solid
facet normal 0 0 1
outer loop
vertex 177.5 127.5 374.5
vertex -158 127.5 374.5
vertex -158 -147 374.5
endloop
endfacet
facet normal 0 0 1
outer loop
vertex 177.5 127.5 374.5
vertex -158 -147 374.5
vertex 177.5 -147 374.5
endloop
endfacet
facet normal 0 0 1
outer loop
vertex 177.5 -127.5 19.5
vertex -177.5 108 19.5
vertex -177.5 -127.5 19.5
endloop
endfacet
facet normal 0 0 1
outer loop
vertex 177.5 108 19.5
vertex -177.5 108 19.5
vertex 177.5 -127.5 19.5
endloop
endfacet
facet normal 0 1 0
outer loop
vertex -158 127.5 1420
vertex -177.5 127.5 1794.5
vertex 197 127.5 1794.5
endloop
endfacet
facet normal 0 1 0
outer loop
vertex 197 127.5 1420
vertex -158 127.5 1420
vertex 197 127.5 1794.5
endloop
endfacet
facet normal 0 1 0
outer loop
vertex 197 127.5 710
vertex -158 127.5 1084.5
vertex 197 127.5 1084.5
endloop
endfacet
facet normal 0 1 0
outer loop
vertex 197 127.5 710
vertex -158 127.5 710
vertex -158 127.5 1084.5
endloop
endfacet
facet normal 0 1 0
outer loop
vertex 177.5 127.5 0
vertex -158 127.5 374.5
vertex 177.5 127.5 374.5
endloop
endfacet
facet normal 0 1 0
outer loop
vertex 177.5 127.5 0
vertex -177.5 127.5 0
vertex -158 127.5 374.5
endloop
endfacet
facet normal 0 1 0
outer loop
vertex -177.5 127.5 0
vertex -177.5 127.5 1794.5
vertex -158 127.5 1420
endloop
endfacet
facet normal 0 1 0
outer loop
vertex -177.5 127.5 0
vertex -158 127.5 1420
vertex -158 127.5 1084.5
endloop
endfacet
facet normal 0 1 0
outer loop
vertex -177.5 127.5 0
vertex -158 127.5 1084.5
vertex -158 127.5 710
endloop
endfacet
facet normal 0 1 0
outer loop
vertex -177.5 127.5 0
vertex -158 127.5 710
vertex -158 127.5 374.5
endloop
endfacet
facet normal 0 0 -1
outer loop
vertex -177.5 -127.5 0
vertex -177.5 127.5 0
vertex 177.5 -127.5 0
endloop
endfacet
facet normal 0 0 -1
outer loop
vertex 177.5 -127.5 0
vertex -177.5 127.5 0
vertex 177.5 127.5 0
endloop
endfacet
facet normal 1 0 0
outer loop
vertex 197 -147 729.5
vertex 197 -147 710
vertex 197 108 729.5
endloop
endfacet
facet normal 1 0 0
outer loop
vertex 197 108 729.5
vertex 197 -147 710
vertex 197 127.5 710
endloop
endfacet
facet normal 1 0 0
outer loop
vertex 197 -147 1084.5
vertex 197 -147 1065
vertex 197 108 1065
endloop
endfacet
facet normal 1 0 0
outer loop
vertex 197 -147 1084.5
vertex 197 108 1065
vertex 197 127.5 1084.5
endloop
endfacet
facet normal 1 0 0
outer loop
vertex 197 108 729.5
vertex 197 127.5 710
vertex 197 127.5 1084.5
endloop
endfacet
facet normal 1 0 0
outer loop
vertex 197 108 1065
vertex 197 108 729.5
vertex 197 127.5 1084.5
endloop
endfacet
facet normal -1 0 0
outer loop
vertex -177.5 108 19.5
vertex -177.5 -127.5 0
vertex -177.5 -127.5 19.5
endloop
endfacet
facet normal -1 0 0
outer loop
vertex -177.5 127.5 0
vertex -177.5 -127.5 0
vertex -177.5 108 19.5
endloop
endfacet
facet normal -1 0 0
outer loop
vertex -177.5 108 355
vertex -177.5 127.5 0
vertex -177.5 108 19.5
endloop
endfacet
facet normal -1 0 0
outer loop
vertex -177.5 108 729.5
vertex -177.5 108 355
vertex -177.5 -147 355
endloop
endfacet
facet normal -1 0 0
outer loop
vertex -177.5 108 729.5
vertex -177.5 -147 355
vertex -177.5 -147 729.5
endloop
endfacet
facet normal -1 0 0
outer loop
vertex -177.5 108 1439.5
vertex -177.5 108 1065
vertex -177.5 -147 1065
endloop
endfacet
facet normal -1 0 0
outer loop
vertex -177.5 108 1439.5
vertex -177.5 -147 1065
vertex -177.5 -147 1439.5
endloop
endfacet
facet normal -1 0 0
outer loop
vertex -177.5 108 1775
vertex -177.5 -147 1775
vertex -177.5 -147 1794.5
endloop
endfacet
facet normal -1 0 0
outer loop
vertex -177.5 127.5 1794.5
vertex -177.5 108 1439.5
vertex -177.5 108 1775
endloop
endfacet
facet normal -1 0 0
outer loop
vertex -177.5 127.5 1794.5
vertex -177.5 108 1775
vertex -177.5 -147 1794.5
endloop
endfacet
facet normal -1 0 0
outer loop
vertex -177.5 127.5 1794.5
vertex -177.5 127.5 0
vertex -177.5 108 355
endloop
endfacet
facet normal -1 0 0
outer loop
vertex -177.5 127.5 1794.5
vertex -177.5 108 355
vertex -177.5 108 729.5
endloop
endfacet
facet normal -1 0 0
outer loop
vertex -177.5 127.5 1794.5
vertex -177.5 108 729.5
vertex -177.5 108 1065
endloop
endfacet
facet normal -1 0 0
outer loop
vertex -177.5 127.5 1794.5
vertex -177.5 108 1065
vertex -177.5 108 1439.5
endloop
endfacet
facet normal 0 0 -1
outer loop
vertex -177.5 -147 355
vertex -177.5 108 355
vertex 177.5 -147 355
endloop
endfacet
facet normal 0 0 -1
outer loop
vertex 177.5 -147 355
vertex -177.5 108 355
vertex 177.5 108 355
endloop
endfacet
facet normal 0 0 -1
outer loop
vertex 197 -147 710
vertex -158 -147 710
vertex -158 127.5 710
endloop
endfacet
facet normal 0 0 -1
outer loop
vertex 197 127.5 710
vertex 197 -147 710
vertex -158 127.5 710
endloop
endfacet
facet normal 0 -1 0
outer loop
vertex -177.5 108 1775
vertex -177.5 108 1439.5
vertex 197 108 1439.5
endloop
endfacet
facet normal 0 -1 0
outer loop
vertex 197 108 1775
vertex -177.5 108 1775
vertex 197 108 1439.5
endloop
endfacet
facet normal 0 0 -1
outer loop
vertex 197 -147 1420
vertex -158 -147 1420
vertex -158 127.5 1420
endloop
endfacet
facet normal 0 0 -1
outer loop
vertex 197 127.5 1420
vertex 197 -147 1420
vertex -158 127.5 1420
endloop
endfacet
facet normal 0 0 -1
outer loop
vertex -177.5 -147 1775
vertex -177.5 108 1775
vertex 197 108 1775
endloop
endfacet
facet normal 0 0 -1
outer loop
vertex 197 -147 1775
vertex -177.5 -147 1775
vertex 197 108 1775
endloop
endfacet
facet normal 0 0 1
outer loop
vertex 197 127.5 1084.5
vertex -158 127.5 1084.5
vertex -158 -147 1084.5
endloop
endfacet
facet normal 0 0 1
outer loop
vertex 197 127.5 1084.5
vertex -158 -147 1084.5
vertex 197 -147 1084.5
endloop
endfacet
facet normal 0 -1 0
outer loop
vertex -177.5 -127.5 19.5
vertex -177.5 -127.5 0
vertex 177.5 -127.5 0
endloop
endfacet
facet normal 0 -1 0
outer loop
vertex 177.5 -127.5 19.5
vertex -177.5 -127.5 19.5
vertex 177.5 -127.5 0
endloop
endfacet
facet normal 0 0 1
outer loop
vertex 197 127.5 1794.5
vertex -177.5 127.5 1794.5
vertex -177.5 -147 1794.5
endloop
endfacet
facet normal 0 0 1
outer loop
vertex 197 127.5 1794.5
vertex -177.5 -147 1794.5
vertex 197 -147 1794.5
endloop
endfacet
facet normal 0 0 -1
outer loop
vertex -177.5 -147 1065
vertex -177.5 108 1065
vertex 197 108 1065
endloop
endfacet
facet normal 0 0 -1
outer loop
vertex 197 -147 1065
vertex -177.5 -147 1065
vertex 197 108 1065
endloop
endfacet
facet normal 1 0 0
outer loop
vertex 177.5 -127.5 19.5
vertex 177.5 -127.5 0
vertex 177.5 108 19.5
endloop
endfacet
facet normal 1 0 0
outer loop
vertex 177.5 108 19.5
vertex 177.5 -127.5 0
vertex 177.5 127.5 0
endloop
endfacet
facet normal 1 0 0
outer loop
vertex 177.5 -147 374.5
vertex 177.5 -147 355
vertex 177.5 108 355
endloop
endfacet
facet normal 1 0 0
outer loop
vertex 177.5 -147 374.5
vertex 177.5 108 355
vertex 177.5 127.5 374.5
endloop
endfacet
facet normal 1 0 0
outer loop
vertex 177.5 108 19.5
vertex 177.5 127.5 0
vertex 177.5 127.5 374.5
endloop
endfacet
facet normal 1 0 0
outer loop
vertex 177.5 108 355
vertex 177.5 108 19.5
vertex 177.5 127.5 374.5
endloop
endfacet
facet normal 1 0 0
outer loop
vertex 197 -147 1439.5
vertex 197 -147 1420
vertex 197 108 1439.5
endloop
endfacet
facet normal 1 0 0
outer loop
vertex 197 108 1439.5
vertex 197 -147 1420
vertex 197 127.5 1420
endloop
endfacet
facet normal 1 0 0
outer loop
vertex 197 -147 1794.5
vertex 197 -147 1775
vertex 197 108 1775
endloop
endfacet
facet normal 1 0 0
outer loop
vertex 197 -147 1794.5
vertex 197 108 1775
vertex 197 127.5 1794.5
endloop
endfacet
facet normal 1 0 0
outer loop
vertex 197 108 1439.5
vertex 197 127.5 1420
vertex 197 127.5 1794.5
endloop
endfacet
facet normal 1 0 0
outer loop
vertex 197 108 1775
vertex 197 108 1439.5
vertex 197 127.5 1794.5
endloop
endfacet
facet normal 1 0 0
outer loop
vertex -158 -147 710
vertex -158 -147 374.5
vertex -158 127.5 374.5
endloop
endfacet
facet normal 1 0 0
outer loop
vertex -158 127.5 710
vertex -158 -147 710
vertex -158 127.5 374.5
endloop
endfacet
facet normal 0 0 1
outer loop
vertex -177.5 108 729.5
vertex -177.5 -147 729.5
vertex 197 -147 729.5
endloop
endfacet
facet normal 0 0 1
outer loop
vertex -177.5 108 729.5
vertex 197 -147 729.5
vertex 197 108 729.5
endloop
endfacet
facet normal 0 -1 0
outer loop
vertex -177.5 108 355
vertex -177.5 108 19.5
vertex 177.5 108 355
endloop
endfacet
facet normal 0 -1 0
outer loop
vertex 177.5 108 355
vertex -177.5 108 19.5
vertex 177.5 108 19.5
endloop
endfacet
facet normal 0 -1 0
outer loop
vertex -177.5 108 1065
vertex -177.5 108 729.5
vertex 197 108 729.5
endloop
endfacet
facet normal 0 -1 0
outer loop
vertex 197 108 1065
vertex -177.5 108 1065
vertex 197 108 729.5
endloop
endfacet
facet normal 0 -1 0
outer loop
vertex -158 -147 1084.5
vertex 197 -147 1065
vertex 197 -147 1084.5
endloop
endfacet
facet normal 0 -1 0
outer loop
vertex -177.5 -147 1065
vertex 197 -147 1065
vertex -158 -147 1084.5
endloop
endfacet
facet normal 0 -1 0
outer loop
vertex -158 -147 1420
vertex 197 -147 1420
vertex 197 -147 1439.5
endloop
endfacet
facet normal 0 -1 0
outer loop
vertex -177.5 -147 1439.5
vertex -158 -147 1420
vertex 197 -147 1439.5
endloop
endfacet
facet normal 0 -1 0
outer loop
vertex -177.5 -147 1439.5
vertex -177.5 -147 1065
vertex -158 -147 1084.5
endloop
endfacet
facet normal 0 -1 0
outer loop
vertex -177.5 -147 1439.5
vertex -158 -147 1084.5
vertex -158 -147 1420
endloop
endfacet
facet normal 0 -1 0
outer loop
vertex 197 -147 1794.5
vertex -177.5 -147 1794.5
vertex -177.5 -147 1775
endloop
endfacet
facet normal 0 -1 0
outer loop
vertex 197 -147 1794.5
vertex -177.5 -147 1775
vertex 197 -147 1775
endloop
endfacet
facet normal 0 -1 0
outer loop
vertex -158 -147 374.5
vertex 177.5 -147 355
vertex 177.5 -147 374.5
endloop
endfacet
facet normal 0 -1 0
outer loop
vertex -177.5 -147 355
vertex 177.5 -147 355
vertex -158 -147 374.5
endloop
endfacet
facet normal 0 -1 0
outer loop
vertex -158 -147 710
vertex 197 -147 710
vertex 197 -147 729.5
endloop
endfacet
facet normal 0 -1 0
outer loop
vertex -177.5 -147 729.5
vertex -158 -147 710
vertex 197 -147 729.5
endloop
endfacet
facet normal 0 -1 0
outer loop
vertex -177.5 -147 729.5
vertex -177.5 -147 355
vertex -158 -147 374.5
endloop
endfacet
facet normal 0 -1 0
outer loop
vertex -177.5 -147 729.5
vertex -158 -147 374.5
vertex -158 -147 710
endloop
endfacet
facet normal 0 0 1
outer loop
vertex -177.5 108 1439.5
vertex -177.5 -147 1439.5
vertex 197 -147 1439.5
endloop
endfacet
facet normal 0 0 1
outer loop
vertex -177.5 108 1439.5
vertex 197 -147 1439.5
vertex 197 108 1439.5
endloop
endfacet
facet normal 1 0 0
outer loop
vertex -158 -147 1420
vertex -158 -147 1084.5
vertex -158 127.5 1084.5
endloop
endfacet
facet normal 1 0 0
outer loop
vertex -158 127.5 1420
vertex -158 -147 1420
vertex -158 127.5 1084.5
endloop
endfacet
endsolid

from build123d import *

# Parameters (mm, degrees)
F0_W      = 355
F0_H      = 255
F1_DEPTH  = 19.5
F2_W      = 355
F2_H      = 19.5
F3_DEPTH  = 355
F4_W      = 355
F4_H      = 19.5
F5_DEPTH  = 255
F6_W      = 19.5
F6_H      = 274.5
F7_DEPTH  = 355
F8_W      = 274.5
F8_H      = 19.5
F9_DEPTH  = 355
F10_W     = 374.5
F10_H     = 19.5
F11_DEPTH = 355
F12_W     = 374.5
F12_H     = 19.5
F13_DEPTH = 255
F14_W     = 19.5
F14_H     = 274.5
F15_DEPTH = 355
F16_W     = 274.5
F16_H     = 19.5
F17_DEPTH = 355
F18_W     = 374.5
F18_H     = 19.5
F19_DEPTH = 355
F20_W     = 374.5
F20_H     = 19.5
F21_DEPTH = 255


with BuildPart() as f1:
    # F0 (on Top) → F1 (new body)
    with BuildSketch(Plane.XY):
        Rectangle(F0_W, F0_H)
    extrude(amount=F1_DEPTH)

    # F2 (on face) → F3 (join)
    with BuildSketch(Plane.XY.offset(19.5)):
        with Locations((0, 117.75)):
            Rectangle(F2_W, F2_H)
    extrude(amount=F3_DEPTH)

    # F4 (on face) → F5 (join)
    with BuildSketch(Plane.XZ.offset(-108)):
        with Locations((0, 364.75)):
            Rectangle(F4_W, F4_H)
    extrude(amount=F5_DEPTH)

    # F6 (on face) → F7 (join)
    with BuildSketch(Plane.XY.offset(374.5)):
        with Locations((-167.75, -9.75)):
            Rectangle(F6_W, F6_H)
    extrude(amount=F7_DEPTH)

    # F8 (on face) → F9 (join)
    with BuildSketch(Plane.YZ.offset(-158)):
        with Locations((-9.75, 719.75)):
            Rectangle(F8_W, F8_H)
    extrude(amount=F9_DEPTH)

    # F10 (on face) → F11 (join)
    with BuildSketch(Plane.XY.offset(729.5)):
        with Locations((9.75, 117.75)):
            Rectangle(F10_W, F10_H)
    extrude(amount=F11_DEPTH)

    # F12 (on face) → F13 (join)
    with BuildSketch(Plane.XZ.offset(-108)):
        with Locations((9.75, 1074.75)):
            Rectangle(F12_W, F12_H)
    extrude(amount=F13_DEPTH)

    # F14 (on face) → F15 (join)
    with BuildSketch(Plane.XY.offset(1084.5)):
        with Locations((-167.75, -9.75)):
            Rectangle(F14_W, F14_H)
    extrude(amount=F15_DEPTH)

    # F16 (on face) → F17 (join)
    with BuildSketch(Plane.YZ.offset(-158)):
        with Locations((-9.75, 1429.75)):
            Rectangle(F16_W, F16_H)
    extrude(amount=F17_DEPTH)

    # F18 (on face) → F19 (join)
    with BuildSketch(Plane.XY.offset(1439.5)):
        with Locations((9.75, 117.75)):
            Rectangle(F18_W, F18_H)
    extrude(amount=F19_DEPTH)

    # F20 (on face) → F21 (join)
    with BuildSketch(Plane.XZ.offset(-108)):
        with Locations((9.75, 1784.75)):
            Rectangle(F20_W, F20_H)
    extrude(amount=F21_DEPTH)


solid = f1.part
